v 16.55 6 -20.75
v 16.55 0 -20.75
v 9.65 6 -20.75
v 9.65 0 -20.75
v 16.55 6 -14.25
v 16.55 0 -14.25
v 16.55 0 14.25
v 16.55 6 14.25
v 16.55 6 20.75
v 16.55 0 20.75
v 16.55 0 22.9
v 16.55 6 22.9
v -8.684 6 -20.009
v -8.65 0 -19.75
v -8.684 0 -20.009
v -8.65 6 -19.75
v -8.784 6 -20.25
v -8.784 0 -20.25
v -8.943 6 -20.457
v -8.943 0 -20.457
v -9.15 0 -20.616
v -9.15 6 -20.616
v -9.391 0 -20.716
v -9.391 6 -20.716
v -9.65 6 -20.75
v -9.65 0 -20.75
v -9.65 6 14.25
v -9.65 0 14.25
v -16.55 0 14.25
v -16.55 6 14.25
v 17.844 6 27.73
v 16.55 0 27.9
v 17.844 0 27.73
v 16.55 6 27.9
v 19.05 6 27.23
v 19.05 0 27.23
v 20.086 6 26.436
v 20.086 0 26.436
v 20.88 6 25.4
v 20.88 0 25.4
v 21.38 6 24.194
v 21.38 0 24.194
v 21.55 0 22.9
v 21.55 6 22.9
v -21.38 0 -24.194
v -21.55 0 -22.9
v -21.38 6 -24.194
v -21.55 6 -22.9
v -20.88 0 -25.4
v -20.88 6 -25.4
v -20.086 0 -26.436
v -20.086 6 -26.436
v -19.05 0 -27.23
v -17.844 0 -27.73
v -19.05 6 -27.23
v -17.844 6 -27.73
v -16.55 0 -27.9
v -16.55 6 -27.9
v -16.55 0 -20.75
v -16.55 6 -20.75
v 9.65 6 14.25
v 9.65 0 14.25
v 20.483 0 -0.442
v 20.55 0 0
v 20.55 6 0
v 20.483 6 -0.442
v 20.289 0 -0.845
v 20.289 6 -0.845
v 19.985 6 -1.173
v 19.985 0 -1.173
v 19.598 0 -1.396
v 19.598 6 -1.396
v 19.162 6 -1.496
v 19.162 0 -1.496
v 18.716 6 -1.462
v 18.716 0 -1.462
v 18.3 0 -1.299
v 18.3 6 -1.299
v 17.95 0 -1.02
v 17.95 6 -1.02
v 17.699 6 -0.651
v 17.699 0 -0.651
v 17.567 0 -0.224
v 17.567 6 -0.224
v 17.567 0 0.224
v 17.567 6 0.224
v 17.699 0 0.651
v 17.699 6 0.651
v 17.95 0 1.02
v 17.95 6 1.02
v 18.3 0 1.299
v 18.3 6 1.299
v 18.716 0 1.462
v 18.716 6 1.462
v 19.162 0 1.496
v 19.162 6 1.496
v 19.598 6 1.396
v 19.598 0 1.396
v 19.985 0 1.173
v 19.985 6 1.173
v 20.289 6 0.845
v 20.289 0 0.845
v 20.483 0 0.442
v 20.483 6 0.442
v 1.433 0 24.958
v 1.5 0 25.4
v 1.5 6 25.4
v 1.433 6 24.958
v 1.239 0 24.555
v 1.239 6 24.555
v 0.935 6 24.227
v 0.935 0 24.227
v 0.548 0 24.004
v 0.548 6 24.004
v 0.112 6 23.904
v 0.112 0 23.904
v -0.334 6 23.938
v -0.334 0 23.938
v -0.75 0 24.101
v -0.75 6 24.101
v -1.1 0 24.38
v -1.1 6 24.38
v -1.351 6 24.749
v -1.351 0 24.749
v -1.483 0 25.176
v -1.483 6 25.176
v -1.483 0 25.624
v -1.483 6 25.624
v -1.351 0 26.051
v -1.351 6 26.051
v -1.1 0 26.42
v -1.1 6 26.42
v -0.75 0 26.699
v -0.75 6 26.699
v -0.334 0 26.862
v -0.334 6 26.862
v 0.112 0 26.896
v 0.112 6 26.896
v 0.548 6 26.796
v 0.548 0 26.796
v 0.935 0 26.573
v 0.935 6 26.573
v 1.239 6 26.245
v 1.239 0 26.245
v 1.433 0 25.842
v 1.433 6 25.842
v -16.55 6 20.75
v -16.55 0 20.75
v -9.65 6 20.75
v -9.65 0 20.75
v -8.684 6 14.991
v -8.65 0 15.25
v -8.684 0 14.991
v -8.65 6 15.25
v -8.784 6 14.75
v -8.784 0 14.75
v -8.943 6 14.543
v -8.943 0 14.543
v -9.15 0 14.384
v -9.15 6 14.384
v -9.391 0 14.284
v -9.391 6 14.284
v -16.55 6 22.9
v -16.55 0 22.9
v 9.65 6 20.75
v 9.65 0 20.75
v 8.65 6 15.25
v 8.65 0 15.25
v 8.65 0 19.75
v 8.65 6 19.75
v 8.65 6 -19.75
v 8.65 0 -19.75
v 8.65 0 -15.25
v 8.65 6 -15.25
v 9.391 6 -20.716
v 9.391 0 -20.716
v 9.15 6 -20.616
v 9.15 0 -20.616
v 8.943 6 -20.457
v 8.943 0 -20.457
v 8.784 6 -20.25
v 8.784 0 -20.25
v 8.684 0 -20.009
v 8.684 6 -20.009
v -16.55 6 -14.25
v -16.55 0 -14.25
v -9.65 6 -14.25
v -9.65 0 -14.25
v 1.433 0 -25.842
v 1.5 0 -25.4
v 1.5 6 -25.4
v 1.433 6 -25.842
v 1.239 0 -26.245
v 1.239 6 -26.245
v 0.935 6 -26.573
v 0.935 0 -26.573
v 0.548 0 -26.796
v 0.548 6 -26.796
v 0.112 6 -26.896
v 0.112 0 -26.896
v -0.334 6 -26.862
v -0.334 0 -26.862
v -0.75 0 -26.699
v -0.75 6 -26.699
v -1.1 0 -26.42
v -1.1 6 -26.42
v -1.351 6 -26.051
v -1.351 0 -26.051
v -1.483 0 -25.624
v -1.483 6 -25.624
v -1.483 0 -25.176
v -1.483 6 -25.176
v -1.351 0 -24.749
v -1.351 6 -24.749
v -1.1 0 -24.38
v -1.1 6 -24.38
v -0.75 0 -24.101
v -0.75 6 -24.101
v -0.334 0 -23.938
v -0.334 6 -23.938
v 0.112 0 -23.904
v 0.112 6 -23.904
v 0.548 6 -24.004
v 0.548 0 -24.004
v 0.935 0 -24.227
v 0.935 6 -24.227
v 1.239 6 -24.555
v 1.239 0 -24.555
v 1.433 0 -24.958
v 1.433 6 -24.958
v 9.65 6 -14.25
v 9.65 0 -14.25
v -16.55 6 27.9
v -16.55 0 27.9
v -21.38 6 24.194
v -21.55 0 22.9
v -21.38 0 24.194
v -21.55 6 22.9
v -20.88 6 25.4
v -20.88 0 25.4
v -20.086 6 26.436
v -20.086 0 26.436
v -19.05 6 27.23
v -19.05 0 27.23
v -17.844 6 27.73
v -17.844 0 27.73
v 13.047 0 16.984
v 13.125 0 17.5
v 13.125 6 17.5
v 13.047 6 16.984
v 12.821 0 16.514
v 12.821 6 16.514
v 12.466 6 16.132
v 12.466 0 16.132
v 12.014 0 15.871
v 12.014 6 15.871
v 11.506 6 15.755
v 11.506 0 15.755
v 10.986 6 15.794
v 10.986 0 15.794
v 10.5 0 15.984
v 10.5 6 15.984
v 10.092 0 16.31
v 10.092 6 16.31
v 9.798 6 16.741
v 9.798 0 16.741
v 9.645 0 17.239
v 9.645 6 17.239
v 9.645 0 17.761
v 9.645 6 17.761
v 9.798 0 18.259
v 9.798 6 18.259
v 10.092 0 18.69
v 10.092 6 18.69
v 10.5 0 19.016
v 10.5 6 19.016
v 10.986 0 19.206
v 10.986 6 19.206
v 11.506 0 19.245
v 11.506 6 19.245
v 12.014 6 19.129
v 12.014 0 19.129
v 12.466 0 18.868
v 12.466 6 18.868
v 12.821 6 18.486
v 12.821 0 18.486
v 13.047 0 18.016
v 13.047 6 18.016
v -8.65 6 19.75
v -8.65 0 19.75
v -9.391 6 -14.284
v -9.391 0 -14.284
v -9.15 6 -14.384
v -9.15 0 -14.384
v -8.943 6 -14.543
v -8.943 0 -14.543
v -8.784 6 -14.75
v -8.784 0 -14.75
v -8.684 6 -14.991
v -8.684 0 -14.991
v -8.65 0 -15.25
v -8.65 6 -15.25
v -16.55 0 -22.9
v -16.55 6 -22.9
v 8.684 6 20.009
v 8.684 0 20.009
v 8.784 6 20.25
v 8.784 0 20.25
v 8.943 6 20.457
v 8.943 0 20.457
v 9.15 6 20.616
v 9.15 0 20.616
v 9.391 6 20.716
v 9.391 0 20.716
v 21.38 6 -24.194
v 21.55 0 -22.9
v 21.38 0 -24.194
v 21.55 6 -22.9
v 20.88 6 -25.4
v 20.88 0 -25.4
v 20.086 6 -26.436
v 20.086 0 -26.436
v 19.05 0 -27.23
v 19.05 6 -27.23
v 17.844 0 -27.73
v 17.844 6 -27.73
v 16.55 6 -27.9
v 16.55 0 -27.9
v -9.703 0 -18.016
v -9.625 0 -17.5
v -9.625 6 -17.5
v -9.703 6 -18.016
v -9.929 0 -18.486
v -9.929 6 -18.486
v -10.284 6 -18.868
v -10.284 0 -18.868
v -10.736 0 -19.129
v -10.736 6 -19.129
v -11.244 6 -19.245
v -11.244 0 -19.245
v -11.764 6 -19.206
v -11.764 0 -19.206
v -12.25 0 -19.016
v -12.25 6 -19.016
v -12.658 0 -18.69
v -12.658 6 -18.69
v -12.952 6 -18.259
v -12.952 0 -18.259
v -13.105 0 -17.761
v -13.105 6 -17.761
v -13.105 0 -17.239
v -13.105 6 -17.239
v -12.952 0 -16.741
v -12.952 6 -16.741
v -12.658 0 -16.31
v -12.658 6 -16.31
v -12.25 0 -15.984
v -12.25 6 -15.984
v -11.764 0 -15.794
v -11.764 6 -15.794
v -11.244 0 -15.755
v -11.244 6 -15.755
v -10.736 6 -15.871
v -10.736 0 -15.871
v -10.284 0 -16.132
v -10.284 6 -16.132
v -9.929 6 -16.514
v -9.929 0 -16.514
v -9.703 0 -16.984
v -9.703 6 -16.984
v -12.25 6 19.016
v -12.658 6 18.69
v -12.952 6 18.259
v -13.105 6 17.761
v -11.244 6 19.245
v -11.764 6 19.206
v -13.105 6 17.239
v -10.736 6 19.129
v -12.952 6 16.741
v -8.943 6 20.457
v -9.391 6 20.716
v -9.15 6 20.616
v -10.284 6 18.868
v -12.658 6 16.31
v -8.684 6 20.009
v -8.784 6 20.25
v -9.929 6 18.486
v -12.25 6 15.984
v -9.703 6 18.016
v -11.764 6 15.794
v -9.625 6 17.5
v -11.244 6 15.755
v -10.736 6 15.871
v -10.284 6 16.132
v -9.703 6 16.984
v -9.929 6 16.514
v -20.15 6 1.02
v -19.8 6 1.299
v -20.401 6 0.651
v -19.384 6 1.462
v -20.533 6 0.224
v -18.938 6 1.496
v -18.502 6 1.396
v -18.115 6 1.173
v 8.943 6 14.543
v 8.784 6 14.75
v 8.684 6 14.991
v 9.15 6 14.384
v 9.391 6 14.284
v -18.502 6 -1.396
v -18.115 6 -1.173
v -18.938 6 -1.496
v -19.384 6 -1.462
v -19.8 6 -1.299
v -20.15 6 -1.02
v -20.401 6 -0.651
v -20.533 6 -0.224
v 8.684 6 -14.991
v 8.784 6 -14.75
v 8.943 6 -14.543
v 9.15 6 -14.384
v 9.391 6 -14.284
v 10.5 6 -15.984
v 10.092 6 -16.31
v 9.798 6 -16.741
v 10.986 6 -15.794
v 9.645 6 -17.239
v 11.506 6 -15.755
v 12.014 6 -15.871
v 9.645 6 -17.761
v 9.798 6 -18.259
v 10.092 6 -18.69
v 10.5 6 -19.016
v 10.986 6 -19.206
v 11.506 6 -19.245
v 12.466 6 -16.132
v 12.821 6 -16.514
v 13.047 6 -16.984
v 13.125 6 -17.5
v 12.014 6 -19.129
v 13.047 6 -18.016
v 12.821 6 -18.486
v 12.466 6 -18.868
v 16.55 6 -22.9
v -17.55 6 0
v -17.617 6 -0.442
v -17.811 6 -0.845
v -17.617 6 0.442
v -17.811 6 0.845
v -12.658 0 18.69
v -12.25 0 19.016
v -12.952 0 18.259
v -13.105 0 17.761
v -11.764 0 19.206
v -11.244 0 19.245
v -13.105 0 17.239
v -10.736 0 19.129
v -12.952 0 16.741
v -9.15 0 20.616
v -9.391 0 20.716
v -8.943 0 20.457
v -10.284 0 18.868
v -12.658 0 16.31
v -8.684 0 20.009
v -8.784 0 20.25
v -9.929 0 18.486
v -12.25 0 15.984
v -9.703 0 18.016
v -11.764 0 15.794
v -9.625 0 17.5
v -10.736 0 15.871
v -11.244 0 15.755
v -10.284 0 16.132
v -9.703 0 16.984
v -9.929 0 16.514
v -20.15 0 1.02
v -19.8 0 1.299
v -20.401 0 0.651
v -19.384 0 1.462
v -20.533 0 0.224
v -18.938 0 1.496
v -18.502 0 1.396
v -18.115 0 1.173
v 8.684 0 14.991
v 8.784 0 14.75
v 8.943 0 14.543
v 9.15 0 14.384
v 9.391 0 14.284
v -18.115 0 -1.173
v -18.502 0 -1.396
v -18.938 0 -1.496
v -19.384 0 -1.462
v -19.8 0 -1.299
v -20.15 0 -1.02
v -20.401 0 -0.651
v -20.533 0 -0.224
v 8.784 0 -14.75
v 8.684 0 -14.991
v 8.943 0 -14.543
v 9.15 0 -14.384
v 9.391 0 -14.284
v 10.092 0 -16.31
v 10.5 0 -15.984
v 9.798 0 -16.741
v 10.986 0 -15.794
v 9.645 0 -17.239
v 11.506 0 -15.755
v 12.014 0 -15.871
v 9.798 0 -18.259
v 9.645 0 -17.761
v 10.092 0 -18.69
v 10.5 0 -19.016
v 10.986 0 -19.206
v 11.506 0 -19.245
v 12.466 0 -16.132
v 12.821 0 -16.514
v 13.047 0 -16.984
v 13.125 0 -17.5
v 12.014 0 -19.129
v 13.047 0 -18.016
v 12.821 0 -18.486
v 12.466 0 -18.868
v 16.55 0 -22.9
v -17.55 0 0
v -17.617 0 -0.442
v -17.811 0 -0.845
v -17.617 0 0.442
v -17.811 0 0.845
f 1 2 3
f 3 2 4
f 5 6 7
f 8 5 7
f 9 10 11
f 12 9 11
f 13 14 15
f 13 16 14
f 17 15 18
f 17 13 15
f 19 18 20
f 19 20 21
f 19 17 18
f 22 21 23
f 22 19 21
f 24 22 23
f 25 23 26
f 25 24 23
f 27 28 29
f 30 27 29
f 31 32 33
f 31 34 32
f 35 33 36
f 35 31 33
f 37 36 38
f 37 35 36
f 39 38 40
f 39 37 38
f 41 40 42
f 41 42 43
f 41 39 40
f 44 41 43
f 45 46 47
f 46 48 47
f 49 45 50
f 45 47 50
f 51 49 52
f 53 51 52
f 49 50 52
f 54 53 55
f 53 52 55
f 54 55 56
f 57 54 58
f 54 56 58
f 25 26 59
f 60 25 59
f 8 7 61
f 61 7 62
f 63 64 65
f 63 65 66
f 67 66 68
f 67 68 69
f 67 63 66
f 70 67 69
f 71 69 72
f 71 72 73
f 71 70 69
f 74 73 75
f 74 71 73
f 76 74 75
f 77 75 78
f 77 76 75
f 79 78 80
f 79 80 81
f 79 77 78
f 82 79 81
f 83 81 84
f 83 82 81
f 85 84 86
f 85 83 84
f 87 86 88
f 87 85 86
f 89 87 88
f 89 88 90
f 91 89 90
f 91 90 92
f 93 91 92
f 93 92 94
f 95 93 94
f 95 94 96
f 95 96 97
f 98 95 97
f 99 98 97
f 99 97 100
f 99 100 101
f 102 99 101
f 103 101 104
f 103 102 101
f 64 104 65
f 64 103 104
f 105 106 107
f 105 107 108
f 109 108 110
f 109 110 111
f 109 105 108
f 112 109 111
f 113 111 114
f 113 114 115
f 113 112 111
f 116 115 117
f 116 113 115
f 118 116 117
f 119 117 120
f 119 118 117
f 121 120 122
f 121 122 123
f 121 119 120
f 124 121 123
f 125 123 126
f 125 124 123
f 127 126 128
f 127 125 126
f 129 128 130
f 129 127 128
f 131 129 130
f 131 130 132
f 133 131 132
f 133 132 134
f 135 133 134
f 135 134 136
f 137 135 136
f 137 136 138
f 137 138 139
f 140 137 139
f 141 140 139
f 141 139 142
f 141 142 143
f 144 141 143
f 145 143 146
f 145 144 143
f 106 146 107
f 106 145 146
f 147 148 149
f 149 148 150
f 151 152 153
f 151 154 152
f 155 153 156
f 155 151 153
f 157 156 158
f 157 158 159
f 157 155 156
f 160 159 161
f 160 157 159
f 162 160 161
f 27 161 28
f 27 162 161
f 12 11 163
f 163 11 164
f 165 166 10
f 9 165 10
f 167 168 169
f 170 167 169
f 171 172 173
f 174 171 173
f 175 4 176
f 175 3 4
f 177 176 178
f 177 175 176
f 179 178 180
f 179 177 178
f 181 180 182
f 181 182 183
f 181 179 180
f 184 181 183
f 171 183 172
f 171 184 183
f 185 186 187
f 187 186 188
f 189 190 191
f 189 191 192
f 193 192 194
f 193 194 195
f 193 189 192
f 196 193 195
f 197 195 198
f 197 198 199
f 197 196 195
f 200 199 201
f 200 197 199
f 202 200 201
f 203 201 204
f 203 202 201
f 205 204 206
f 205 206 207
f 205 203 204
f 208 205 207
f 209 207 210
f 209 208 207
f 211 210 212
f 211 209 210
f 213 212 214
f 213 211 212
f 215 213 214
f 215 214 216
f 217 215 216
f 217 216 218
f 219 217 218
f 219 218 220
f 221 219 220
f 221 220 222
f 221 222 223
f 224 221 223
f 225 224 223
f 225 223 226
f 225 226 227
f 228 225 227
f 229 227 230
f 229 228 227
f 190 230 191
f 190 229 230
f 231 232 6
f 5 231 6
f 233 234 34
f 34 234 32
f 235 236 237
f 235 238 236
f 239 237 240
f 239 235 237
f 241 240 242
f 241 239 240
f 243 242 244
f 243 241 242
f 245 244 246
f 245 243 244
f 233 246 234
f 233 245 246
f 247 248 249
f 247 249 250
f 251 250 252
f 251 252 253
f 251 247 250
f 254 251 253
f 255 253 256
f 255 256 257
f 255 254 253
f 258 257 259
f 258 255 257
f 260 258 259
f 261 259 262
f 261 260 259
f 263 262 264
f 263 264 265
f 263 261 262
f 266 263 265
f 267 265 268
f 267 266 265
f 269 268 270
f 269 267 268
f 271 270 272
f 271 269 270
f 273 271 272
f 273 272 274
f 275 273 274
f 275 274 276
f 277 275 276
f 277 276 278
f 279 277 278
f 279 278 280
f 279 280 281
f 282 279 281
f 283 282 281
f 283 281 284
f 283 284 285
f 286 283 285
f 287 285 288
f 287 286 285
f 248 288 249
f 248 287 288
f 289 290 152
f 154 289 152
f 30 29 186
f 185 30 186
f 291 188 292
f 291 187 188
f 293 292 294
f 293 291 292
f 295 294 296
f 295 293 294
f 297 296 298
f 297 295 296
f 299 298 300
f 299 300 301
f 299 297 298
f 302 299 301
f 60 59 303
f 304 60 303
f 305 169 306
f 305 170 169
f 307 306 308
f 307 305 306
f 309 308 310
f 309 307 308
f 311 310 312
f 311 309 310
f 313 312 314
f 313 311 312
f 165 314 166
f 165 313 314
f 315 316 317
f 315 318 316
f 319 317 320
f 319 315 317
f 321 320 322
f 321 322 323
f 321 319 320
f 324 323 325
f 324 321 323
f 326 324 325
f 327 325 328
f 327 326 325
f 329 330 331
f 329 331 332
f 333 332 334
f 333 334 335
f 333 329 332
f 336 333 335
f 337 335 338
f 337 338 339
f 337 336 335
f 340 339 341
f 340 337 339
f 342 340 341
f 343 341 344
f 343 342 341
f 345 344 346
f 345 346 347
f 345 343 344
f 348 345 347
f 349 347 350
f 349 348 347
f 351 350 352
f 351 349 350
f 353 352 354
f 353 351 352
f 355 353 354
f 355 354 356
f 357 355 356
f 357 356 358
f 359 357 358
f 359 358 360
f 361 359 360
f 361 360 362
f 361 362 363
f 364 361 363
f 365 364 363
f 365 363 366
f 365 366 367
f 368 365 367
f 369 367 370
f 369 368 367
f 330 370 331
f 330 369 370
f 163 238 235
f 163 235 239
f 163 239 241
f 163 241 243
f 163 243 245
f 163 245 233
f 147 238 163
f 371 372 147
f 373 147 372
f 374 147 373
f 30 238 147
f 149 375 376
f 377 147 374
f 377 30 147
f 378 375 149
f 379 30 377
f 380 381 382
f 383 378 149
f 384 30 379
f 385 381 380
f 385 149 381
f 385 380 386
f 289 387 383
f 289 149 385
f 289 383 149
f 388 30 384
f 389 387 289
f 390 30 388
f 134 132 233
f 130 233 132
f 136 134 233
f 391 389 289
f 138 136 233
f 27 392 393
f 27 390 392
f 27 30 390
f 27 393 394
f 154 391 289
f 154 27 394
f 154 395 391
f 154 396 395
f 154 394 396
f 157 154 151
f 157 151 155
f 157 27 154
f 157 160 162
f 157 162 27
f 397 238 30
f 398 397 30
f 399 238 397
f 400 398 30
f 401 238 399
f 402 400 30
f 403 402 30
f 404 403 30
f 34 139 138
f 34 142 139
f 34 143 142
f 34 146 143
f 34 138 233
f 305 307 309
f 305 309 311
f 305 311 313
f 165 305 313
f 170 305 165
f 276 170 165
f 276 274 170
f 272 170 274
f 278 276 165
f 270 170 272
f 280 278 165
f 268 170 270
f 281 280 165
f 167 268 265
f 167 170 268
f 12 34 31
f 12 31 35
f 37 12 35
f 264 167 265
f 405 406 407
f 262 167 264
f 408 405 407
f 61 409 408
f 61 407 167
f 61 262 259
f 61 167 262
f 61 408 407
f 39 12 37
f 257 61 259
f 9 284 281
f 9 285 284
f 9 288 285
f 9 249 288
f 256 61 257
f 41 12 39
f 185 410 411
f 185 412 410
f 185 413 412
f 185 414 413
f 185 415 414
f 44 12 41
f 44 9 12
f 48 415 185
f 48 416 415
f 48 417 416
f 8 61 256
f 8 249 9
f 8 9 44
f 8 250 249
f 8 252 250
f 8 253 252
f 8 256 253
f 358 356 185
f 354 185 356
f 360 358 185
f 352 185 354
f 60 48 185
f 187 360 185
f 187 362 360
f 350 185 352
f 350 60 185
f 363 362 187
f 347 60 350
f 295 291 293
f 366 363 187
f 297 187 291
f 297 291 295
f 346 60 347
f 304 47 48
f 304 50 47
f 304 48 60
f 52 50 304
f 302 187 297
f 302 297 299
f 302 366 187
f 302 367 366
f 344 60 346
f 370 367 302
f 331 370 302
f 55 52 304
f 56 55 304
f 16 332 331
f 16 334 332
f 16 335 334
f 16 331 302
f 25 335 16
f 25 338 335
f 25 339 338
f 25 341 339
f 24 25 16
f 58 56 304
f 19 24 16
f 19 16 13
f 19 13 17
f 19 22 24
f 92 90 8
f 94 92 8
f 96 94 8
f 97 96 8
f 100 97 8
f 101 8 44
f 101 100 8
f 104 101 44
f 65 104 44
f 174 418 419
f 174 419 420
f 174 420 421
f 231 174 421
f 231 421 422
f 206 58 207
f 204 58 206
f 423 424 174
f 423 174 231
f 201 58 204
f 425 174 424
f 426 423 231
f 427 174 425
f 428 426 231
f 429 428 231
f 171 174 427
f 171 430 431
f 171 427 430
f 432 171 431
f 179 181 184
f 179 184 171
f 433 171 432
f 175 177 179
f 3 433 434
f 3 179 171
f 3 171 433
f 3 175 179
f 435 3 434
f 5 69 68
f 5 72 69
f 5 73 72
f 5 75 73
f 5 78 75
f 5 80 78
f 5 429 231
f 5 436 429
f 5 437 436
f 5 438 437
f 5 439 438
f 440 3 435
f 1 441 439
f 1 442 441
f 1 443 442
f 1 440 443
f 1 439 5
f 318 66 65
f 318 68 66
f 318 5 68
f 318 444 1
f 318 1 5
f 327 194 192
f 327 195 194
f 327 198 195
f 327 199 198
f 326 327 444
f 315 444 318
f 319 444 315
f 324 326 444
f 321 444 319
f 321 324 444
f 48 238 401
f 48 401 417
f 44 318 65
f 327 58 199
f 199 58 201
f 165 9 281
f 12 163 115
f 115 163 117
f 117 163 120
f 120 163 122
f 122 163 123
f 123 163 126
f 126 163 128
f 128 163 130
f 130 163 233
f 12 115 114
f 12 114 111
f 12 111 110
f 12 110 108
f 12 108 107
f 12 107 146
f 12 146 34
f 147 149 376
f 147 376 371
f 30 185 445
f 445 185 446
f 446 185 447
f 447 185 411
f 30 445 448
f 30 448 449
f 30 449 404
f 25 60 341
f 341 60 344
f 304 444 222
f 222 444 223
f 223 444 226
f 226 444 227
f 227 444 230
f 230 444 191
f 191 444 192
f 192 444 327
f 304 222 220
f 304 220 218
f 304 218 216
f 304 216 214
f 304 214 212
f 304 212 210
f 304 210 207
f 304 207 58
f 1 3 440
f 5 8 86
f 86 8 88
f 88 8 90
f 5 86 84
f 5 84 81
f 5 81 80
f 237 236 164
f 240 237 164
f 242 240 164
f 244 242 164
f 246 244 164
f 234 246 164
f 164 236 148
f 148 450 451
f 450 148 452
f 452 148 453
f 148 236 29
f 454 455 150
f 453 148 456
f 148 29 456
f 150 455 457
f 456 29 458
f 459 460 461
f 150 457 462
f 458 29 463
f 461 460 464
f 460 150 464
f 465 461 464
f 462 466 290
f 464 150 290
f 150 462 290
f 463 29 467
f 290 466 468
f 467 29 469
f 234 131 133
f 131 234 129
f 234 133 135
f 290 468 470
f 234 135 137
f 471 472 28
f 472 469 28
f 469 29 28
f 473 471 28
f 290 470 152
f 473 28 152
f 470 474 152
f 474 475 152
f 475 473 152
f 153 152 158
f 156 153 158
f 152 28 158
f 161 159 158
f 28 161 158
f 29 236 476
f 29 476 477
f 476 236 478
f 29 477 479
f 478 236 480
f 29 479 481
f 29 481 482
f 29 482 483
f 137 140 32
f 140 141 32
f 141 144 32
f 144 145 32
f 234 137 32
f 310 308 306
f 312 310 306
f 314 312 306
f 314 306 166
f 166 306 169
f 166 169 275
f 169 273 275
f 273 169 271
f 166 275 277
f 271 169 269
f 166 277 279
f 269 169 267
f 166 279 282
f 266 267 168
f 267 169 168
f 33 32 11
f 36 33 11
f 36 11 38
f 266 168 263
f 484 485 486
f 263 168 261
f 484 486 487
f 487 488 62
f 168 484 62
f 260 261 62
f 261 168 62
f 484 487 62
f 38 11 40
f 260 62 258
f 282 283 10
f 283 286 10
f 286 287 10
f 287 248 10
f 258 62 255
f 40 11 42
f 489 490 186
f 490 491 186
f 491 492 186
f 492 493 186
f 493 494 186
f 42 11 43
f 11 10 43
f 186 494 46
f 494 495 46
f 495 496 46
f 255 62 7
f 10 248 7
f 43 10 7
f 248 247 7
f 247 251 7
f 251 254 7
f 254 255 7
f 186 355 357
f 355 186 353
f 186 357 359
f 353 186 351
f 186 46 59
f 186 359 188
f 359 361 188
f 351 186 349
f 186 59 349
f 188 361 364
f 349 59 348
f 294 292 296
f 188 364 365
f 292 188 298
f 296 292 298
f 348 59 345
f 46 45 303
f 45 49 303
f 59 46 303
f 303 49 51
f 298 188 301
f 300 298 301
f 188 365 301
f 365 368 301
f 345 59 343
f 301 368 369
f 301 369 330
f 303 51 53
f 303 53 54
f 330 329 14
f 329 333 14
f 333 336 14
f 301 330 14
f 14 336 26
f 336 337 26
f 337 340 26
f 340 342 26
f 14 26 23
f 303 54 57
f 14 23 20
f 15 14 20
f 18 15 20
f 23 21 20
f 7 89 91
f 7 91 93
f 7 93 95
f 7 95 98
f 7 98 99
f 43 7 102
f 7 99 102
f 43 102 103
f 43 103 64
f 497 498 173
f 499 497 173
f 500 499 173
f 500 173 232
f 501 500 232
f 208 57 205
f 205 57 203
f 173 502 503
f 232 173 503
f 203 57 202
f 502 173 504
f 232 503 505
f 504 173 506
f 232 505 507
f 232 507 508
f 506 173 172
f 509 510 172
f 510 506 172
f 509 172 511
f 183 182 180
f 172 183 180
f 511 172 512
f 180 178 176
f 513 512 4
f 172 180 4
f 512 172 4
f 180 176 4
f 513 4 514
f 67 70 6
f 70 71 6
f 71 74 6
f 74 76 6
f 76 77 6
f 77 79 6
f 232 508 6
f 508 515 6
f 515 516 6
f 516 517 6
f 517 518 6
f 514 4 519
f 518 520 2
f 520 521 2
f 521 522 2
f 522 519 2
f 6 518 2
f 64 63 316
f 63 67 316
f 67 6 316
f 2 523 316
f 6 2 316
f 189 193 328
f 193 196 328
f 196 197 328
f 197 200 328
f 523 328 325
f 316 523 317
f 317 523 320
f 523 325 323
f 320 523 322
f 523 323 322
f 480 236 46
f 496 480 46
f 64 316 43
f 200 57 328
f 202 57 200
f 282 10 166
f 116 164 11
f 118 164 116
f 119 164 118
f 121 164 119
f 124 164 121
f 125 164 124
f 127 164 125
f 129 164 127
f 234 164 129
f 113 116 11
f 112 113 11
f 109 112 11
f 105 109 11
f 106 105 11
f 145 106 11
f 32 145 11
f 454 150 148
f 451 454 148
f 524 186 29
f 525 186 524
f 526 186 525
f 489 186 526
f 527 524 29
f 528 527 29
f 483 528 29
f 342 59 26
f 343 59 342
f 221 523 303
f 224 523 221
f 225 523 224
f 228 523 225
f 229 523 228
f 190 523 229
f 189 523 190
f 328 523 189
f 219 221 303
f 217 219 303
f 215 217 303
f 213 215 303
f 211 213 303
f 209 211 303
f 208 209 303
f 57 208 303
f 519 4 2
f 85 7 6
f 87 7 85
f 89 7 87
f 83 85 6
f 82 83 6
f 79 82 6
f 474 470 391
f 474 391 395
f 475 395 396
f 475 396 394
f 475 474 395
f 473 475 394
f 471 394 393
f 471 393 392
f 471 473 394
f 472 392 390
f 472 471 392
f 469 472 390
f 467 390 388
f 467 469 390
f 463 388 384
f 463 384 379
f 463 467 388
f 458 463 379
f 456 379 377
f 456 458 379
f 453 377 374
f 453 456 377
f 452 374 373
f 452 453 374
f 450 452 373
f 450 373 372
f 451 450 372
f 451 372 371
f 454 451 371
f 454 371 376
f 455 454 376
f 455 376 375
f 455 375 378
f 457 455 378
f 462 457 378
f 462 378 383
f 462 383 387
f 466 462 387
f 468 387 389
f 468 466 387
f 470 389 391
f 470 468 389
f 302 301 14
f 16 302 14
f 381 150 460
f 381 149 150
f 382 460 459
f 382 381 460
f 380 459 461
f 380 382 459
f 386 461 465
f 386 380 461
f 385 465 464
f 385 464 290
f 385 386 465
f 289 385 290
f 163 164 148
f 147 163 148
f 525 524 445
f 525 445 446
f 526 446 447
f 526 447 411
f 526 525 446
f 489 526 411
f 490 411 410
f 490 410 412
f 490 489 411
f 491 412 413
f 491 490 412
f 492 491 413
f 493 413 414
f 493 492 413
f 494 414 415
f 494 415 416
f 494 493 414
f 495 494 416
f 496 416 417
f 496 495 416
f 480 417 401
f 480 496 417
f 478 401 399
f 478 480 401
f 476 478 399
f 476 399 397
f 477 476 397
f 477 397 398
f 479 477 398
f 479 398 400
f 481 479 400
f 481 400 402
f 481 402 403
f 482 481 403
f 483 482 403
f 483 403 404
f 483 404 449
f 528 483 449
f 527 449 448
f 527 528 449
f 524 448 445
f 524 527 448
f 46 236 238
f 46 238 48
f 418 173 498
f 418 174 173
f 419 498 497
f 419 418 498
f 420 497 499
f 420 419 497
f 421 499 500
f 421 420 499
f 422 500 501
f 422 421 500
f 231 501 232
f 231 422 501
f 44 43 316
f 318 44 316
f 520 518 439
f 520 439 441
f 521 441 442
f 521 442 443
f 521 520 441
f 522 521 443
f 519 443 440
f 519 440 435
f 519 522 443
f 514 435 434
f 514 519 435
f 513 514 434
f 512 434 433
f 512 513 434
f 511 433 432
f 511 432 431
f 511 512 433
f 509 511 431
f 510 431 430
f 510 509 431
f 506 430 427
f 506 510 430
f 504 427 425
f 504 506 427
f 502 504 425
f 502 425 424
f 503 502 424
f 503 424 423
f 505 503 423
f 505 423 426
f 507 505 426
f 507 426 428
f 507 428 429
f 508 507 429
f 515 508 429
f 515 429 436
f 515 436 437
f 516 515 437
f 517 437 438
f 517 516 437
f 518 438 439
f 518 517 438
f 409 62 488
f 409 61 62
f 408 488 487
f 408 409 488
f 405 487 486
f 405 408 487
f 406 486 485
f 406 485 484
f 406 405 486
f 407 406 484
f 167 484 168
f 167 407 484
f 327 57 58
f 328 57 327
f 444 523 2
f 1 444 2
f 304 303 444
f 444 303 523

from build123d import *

# Parameters (mm, degrees)
SKETCH1_W           = 43.1
SKETCH1_H           = 55.8
SKETCH1_R           = 1.75
SKETCH1_R_2         = 1.5
BOSS_EXTRUDE1_DEPTH = 6
FILLET3_R           = 5
FILLET4_R           = 1


with BuildPart() as part:
    # Sketch1 → Boss-Extrude1 (new body)
    with BuildSketch(Plane(origin=(0, 0, 0), x_dir=(1, 0, 0), z_dir=(0, 1, 0))):
        Rectangle(SKETCH1_W, SKETCH1_H)
        with Locations((11.375, 17.5)):
            Circle(SKETCH1_R, mode=Mode.SUBTRACT)
        with Locations((11.375, -17.5)):
            Circle(SKETCH1_R, mode=Mode.SUBTRACT)
        with Locations((-11.375, -17.5)):
            Circle(SKETCH1_R, mode=Mode.SUBTRACT)
        with Locations((-11.375, 17.5)):
            Circle(SKETCH1_R, mode=Mode.SUBTRACT)
        with Locations((0, 25.4)):
            Circle(SKETCH1_R_2, mode=Mode.SUBTRACT)
        with Locations((-19.05, 0)):
            Circle(SKETCH1_R_2, mode=Mode.SUBTRACT)
        with Locations((19.05, 0)):
            Circle(SKETCH1_R_2, mode=Mode.SUBTRACT)
        with Locations((0, -25.4)):
            Circle(SKETCH1_R_2, mode=Mode.SUBTRACT)
        Polygon((14.25, -14.25), (8.65, -14.25), (8.65, -20.75), (14.25, -20.75), (16.55, -20.75), (16.55, -22.9), (-16.55, -22.9), (-16.55, -20.75), (-14.25, -20.75), (-8.65, -20.75), (-8.65, -14.25), (-14.25, -14.25), (-16.55, -14.25), (-16.55, 14.25), (-14.25, 14.25), (-8.65, 14.25), (-8.65, 20.75), (-14.25, 20.75), (-16.55, 20.75), (-16.55, 22.9), (16.55, 22.9), (16.55, 20.75), (14.25, 20.75), (8.65, 20.75), (8.65, 14.25), (14.25, 14.25), (16.55, 14.25), (16.55, -14.25), align=None, mode=Mode.SUBTRACT)
    extrude(amount=BOSS_EXTRUDE1_DEPTH)

    # Fillet3
    fillet3_edges = [part.edges().sort_by_distance(p)[0] for p in [
        (-21.55, 3, 27.9),
        (-21.55, 3, -27.9),
        (21.55, 3, -27.9),
        (21.55, 3, 27.9),
    ]]
    fillet(fillet3_edges, radius=FILLET3_R)

    # Fillet4
    fillet4_edges = [part.edges().sort_by_distance(p)[0] for p in [
        (-8.65, 3, -20.75),
        (-8.65, 3, -14.25),
        (-8.65, 3, 14.25),
        (-8.65, 3, 20.75),
        (8.65, 3, 20.75),
        (8.65, 3, 14.25),
        (8.65, 3, -14.25),
        (8.65, 3, -20.75),
    ]]
    fillet(fillet4_edges, radius=FILLET4_R)


solid = part.part
